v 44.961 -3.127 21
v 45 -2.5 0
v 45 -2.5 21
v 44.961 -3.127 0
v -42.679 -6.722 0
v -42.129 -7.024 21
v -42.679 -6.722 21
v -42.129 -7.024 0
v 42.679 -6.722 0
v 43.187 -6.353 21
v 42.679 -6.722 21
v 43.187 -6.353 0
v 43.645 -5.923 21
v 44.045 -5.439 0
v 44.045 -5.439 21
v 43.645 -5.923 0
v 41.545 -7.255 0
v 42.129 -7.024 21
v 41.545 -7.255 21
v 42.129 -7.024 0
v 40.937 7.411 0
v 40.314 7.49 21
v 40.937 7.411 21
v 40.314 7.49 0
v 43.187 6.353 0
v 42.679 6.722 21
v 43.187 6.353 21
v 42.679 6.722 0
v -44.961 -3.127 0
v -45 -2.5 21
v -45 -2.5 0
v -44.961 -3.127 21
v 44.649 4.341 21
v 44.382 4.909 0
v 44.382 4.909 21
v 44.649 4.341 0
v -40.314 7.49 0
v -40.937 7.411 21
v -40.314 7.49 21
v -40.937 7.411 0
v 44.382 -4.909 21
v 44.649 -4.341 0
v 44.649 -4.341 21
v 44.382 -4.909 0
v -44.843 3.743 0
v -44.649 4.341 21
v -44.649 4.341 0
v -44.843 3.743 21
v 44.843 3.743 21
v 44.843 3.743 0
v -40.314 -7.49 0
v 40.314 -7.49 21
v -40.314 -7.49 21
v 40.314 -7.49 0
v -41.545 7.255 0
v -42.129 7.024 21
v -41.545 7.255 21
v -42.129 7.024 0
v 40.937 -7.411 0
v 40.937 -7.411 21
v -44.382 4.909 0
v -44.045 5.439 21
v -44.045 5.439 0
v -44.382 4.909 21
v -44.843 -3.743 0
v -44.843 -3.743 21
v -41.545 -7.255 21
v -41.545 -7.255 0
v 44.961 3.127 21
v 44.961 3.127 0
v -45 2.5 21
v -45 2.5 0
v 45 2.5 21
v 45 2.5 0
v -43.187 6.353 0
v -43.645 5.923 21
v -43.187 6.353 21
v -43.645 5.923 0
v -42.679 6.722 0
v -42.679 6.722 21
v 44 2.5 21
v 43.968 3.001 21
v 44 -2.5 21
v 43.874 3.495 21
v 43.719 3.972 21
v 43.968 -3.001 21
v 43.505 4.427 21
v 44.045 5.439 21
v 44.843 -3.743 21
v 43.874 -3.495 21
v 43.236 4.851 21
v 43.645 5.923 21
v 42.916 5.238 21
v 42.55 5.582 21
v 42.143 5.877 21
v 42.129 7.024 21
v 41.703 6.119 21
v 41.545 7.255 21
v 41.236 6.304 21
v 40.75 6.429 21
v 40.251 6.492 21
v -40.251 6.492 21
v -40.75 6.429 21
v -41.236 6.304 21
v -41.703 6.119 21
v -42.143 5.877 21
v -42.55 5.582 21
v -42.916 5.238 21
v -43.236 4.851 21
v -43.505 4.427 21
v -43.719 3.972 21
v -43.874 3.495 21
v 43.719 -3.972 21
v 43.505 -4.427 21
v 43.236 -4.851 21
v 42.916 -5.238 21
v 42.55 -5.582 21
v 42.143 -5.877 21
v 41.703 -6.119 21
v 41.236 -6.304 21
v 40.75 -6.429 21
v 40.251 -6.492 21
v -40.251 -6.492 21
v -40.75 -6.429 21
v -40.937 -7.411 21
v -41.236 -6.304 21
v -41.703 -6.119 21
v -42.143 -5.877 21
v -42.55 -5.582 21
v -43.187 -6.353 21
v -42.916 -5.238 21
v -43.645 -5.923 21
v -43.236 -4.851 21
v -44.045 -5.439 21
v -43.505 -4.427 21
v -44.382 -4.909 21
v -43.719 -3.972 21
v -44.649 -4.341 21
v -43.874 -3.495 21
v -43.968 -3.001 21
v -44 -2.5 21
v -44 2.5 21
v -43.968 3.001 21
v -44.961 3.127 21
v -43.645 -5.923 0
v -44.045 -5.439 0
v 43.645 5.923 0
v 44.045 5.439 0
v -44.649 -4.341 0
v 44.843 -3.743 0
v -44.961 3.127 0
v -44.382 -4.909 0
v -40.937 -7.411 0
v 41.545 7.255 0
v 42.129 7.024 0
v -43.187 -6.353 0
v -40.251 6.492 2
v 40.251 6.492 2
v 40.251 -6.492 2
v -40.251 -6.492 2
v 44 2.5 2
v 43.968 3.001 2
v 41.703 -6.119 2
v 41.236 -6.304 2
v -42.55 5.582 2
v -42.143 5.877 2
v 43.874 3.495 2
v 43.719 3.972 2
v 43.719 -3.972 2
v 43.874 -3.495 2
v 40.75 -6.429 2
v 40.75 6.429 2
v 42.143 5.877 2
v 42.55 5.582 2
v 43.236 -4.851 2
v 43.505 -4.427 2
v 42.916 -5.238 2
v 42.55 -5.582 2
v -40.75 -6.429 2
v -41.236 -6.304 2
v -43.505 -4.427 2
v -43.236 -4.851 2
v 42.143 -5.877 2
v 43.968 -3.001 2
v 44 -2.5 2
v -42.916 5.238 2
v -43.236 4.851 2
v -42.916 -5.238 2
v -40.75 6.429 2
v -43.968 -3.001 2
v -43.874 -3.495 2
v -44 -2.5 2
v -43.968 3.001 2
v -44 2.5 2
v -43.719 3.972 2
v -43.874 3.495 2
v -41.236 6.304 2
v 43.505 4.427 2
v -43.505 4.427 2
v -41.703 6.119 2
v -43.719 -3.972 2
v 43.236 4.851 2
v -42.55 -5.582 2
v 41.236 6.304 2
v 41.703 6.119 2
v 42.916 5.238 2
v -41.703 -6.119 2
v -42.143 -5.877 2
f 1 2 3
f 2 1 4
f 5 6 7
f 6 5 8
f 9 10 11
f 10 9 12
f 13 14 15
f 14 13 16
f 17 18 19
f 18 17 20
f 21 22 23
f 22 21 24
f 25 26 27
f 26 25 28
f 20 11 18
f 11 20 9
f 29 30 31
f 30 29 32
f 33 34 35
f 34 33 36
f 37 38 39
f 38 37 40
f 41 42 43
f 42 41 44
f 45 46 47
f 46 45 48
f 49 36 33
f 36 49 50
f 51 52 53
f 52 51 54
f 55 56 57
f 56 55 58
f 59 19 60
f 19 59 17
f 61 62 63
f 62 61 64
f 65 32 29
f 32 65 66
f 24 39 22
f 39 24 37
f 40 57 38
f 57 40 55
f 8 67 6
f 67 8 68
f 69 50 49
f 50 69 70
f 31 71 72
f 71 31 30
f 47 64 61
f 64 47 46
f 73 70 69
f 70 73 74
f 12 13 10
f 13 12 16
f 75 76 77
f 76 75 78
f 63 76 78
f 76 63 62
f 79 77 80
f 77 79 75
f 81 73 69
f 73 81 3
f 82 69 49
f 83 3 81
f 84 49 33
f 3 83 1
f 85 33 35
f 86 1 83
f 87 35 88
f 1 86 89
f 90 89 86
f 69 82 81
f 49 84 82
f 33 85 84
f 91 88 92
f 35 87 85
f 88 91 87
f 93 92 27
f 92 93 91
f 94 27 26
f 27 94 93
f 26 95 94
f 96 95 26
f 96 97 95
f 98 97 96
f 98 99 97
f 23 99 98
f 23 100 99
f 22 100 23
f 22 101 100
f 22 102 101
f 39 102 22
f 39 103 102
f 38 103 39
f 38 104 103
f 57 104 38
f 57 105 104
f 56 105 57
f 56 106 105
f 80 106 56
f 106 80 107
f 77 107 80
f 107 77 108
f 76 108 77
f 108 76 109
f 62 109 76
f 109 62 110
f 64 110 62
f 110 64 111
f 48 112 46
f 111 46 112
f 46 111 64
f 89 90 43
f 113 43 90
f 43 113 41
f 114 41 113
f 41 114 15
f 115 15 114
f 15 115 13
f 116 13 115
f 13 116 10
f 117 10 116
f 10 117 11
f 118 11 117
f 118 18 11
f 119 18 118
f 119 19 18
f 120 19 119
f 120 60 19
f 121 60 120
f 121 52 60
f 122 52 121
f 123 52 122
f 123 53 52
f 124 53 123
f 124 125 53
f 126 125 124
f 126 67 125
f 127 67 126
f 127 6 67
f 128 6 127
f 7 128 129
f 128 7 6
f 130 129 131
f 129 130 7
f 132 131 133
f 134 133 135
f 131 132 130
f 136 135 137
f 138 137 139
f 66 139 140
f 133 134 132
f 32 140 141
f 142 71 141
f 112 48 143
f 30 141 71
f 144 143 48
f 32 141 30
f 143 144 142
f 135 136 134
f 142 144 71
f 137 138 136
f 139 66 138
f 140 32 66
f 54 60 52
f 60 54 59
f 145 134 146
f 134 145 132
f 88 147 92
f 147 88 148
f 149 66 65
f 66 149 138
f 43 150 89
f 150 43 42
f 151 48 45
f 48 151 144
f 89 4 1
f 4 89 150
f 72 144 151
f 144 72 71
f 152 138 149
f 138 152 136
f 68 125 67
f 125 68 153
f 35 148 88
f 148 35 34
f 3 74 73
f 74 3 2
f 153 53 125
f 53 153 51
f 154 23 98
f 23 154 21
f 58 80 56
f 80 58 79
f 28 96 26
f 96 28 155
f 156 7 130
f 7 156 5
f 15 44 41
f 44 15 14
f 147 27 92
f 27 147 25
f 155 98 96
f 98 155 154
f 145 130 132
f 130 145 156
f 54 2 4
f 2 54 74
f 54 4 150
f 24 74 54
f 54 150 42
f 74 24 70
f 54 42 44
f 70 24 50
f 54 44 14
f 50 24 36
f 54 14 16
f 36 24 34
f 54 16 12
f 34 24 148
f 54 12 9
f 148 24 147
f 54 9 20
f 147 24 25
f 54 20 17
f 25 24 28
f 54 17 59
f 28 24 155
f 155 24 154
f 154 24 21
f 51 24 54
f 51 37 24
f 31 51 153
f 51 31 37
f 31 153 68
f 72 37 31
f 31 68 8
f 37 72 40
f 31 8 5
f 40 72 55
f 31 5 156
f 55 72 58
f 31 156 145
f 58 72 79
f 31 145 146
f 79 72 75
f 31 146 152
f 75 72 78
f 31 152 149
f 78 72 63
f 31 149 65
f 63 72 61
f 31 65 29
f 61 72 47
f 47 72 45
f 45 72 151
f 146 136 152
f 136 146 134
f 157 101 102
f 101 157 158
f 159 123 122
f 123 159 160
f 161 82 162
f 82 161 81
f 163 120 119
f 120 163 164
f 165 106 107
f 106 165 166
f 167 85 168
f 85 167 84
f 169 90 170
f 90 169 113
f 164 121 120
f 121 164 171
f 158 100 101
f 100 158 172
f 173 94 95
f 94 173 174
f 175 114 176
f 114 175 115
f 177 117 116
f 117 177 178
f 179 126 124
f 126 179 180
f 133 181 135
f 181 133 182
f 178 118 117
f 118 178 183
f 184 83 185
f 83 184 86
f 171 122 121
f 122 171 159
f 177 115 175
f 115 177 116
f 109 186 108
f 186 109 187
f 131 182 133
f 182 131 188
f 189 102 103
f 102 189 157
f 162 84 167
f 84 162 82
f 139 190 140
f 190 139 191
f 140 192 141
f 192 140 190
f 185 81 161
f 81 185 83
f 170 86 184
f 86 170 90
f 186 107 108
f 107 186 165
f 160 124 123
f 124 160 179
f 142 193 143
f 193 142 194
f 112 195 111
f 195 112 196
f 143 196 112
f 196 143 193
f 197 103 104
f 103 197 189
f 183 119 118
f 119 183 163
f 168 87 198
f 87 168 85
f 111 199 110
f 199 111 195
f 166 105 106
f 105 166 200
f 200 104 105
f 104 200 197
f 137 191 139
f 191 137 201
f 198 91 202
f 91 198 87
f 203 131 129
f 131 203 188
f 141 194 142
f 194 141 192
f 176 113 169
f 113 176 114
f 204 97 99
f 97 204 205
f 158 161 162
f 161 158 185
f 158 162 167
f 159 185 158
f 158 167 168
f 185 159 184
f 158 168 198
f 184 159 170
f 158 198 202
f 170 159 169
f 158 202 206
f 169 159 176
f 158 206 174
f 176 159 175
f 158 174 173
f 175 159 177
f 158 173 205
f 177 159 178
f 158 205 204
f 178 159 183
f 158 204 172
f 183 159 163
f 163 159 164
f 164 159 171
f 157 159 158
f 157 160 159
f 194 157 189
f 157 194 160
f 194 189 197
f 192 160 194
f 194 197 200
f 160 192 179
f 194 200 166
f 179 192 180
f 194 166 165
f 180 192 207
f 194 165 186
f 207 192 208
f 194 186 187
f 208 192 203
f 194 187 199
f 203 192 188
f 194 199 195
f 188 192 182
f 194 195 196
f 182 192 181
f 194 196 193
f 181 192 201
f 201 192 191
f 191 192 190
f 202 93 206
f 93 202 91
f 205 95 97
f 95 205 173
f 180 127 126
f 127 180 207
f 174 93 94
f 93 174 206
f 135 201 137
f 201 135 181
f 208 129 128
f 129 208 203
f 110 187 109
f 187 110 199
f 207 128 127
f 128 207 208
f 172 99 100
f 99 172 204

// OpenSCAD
$fn = 50;


difference() {
	union() {
		hull() {
			translate(v = [-40.0000000000, 2.5000000000, 0]) {
				cylinder(h = 21, r = 5);
			}
			translate(v = [40.0000000000, 2.5000000000, 0]) {
				cylinder(h = 21, r = 5);
			}
			translate(v = [-40.0000000000, -2.5000000000, 0]) {
				cylinder(h = 21, r = 5);
			}
			translate(v = [40.0000000000, -2.5000000000, 0]) {
				cylinder(h = 21, r = 5);
			}
		}
	}
	union() {
		translate(v = [0, 0, 2]) {
			#hull() {
				translate(v = [-40.0000000000, 2.5000000000, 0]) {
					cylinder(h = 19, r = 4);
				}
				translate(v = [40.0000000000, 2.5000000000, 0]) {
					cylinder(h = 19, r = 4);
				}
				translate(v = [-40.0000000000, -2.5000000000, 0]) {
					cylinder(h = 19, r = 4);
				}
				translate(v = [40.0000000000, -2.5000000000, 0]) {
					cylinder(h = 19, r = 4);
				}
			}
		}
	}
}
